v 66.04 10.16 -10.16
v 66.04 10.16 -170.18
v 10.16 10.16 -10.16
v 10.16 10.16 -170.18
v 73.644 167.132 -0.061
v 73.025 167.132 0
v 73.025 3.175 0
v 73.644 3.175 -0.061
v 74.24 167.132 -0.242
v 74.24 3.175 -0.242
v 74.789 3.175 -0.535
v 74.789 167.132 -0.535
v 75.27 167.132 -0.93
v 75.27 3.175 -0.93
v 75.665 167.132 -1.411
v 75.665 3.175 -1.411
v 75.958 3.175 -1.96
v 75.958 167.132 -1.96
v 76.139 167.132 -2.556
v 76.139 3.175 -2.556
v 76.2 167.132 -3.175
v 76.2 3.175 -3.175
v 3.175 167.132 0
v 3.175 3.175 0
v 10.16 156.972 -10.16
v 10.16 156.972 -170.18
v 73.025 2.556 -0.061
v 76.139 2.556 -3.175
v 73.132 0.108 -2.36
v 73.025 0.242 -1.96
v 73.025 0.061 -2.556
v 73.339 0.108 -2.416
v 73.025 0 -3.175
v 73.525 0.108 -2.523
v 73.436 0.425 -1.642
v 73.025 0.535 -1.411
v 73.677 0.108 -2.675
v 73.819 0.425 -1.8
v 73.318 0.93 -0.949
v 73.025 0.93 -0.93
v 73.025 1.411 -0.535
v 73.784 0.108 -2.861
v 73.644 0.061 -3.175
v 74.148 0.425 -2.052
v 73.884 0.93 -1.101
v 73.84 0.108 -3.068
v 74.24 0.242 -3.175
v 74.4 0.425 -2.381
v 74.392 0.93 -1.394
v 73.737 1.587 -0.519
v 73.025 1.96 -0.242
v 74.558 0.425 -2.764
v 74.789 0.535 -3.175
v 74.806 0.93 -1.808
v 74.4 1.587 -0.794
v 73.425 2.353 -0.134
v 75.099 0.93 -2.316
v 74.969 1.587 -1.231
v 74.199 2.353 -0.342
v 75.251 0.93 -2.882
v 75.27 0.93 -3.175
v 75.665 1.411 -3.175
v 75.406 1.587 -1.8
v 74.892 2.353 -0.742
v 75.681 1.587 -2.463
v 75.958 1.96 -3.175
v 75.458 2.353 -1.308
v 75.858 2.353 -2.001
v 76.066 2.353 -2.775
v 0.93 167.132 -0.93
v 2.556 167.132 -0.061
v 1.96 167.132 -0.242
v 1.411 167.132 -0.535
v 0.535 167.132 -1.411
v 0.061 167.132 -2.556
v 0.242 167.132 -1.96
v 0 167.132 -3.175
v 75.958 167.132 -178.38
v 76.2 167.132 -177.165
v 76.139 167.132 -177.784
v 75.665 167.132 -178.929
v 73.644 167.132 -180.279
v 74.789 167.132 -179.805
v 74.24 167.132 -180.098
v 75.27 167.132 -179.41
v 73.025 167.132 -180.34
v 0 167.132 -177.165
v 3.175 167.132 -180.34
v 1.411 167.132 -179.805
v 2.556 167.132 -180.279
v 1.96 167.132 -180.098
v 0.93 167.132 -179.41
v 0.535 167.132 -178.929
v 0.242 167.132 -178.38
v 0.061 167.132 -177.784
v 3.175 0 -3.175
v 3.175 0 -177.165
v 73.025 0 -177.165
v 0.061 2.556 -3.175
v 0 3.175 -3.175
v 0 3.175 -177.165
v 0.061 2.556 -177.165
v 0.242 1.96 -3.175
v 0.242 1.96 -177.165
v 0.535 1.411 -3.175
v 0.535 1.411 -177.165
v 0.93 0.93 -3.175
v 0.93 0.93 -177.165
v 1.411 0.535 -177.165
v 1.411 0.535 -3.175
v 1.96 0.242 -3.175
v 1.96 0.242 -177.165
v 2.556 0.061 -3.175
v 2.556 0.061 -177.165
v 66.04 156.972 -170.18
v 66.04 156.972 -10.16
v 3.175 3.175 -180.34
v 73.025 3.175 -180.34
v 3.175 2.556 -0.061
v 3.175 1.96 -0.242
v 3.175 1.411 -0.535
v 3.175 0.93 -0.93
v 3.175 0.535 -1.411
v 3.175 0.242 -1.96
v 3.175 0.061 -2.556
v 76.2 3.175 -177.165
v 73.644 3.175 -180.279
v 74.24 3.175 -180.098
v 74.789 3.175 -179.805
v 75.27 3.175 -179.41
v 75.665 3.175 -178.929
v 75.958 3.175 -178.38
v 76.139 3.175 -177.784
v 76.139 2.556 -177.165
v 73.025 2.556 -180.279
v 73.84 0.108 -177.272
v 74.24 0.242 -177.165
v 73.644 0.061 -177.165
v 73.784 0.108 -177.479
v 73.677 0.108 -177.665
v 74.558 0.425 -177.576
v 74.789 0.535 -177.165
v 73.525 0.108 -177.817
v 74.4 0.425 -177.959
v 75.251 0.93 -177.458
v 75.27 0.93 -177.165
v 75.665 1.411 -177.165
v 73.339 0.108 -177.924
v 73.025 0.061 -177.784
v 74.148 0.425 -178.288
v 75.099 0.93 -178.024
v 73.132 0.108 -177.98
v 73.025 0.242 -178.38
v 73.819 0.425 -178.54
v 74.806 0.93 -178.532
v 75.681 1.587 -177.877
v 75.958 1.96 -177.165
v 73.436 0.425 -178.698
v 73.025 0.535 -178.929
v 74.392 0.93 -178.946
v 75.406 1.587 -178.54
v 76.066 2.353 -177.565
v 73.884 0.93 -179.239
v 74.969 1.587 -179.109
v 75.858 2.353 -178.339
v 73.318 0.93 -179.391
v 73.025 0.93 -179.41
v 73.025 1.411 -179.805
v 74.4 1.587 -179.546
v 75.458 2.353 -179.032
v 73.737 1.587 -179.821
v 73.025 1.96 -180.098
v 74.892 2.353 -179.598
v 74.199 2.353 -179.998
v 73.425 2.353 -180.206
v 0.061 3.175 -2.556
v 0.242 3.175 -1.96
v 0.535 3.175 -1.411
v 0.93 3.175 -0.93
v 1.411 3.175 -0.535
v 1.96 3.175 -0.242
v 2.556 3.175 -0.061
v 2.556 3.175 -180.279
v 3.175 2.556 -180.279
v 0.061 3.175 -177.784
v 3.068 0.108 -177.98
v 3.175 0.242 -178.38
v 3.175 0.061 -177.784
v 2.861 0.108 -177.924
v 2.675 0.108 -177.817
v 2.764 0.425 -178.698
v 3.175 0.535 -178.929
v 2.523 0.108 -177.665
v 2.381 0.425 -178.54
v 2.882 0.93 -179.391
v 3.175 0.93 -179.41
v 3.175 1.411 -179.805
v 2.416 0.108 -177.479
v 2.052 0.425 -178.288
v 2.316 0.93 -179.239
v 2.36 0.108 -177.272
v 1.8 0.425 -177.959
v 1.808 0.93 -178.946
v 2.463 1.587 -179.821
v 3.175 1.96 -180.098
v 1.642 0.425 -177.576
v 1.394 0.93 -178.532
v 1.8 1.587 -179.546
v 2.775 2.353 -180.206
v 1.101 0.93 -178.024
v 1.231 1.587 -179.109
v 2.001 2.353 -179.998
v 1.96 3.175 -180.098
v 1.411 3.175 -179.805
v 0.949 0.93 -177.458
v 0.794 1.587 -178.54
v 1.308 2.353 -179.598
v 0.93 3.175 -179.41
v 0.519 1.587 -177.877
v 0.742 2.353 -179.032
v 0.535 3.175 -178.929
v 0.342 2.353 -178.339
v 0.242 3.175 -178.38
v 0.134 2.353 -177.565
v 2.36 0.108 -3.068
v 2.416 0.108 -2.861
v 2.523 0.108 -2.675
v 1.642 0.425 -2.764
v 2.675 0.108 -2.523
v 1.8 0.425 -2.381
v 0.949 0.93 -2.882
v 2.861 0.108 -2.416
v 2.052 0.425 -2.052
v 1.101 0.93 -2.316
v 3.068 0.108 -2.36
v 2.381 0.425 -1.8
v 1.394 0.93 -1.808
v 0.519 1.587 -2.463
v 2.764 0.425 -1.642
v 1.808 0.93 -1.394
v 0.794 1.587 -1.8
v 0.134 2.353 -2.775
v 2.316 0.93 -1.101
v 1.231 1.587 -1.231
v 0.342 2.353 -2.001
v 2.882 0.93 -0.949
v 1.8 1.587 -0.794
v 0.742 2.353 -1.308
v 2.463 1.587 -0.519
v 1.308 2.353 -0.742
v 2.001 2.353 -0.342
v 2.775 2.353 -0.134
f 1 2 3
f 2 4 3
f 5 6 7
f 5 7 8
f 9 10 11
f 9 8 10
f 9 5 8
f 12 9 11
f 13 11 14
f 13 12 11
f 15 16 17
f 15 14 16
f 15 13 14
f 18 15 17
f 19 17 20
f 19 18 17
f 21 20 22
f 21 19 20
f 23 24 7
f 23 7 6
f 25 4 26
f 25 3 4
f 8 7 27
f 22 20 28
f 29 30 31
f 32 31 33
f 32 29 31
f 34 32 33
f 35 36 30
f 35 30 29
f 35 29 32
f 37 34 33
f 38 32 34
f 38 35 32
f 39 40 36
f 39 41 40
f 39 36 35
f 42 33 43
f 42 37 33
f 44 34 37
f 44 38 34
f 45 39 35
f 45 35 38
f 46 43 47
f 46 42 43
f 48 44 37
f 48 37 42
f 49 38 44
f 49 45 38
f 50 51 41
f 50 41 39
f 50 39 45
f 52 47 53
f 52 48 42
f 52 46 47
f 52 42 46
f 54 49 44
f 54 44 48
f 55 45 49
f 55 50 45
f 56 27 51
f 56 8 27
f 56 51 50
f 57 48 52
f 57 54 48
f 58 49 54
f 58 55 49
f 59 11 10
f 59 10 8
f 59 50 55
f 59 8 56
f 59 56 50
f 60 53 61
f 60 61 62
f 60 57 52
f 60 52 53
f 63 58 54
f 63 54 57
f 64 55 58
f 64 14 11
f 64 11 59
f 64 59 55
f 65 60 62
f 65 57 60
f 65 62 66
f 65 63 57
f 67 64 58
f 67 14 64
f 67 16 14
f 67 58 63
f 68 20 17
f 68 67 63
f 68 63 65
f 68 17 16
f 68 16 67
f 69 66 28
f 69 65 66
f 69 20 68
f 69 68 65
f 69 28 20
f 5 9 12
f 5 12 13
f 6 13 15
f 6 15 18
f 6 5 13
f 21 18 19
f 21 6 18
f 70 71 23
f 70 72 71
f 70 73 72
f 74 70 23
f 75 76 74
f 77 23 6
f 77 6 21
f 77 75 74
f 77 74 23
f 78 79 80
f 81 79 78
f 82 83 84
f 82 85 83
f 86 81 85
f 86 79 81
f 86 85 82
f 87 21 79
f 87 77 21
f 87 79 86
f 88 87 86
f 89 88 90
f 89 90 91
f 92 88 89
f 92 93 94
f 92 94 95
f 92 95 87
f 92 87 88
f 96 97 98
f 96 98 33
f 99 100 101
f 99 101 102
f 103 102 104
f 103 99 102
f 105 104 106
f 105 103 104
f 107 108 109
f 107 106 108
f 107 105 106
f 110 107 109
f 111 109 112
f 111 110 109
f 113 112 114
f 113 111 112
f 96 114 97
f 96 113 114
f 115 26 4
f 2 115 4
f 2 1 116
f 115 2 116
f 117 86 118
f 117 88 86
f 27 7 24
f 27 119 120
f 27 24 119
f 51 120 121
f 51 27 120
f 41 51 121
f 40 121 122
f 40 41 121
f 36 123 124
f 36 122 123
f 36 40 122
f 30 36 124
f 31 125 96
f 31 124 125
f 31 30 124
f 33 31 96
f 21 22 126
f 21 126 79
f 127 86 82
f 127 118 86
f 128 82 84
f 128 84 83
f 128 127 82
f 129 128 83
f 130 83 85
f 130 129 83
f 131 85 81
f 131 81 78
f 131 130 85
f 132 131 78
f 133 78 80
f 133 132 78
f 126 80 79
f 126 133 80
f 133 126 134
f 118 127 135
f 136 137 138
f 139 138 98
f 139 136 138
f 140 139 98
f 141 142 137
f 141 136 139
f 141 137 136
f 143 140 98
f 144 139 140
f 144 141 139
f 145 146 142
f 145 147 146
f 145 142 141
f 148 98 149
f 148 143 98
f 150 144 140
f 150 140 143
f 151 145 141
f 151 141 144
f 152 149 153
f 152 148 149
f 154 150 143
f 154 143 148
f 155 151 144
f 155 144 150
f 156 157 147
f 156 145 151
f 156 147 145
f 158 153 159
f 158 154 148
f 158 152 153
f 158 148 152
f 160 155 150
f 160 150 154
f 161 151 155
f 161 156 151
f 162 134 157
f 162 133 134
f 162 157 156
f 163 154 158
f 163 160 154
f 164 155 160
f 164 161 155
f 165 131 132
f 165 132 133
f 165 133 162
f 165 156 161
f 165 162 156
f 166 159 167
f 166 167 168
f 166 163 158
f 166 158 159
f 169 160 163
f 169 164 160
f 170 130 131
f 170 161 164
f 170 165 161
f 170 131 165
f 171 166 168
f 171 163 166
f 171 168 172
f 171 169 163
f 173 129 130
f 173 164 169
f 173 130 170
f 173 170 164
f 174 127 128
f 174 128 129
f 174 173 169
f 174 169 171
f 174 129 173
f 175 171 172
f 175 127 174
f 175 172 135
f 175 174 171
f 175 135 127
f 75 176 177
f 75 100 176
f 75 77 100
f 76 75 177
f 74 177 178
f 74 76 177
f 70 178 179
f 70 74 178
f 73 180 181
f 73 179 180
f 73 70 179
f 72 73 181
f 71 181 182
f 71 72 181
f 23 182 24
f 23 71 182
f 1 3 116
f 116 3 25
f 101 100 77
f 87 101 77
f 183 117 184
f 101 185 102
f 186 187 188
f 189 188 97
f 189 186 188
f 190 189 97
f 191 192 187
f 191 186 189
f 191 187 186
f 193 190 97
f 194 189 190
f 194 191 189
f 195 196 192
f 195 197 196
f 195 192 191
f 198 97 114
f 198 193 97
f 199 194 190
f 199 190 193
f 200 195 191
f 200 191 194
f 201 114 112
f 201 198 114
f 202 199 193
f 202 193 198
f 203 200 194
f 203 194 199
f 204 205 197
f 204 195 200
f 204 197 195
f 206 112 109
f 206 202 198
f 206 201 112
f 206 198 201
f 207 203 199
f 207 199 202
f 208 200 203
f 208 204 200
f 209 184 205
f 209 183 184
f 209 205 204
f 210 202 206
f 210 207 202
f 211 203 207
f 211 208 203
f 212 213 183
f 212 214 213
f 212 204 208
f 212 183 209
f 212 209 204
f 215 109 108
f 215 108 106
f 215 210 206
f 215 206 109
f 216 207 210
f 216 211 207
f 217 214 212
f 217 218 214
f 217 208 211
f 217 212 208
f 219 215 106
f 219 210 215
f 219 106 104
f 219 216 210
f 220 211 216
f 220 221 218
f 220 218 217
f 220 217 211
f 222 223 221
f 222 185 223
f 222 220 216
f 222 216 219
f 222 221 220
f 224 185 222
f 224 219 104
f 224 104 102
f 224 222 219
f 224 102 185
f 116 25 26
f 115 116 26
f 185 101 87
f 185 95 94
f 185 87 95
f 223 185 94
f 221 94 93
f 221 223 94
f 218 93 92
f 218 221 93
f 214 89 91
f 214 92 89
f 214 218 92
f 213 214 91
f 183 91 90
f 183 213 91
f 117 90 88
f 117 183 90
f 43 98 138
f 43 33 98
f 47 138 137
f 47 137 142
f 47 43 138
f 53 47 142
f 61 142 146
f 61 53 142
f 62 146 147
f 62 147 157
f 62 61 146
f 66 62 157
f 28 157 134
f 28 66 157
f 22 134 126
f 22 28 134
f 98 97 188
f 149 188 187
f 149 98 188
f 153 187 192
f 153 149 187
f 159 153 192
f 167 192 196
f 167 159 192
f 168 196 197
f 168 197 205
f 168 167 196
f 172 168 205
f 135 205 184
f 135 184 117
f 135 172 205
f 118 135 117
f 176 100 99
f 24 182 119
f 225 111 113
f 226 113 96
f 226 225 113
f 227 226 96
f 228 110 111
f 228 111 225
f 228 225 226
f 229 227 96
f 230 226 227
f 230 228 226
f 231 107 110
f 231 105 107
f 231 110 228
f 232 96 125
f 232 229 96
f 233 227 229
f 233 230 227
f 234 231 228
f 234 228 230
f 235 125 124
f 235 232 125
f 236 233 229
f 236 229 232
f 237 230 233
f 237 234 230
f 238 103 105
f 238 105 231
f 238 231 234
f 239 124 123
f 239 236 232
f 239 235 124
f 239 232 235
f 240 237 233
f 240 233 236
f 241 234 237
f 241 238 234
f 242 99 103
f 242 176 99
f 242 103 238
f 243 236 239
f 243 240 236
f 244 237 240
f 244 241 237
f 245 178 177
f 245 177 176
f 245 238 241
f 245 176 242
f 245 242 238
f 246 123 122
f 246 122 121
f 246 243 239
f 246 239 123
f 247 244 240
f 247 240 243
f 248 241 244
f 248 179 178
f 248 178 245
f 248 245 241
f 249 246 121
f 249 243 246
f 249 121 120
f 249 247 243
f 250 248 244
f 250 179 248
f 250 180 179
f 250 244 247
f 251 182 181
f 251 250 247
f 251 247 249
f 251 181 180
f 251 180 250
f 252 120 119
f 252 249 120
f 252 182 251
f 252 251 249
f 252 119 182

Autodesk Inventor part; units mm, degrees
ref_plane "YZ Plane" through (0, 0, 0) normal (1, 0, 0) x (0, 1, 0)
ref_plane "XZ Plane" through (0, 0, 0) normal (0, 1, 0) x (-1, 0, 0)
ref_plane "XY Plane" through (0, 0, 0) normal (0, 0, 1) x (1, 0, 0)
sketch "Sketch1" plane through (0, 0, 0) normal (1, 0, 0) x (0, 1, 0)
  line L0 (0, 0) -> (167.132, 0)
  line L1 (167.132, 0) -> (167.132, -180.34)
  line L2 (167.132, -180.34) -> (0, -180.34)
  line L3 (0, -180.34) -> (0, 0)
  dimension "d0" = 167.132
  dimension "d1" = 180.34
extrude "Extrusion1" add sketch "Sketch1" along normal blind 76.2
fillet "Fillet1" radius 3.175 8 edges at (76.2, 83.566, 0) (0, 83.566, 0) (76.2, 83.566, -180.34) (0, 83.566, -180.34) (38.1, 0, -180.34) (76.2, 0, -90.17) (38.1, 0, 0) (0, 0, -90.17)
shell "Shell1" thickness 10.16 removed faces 0
properties part number "Battery" material "Concrete"
